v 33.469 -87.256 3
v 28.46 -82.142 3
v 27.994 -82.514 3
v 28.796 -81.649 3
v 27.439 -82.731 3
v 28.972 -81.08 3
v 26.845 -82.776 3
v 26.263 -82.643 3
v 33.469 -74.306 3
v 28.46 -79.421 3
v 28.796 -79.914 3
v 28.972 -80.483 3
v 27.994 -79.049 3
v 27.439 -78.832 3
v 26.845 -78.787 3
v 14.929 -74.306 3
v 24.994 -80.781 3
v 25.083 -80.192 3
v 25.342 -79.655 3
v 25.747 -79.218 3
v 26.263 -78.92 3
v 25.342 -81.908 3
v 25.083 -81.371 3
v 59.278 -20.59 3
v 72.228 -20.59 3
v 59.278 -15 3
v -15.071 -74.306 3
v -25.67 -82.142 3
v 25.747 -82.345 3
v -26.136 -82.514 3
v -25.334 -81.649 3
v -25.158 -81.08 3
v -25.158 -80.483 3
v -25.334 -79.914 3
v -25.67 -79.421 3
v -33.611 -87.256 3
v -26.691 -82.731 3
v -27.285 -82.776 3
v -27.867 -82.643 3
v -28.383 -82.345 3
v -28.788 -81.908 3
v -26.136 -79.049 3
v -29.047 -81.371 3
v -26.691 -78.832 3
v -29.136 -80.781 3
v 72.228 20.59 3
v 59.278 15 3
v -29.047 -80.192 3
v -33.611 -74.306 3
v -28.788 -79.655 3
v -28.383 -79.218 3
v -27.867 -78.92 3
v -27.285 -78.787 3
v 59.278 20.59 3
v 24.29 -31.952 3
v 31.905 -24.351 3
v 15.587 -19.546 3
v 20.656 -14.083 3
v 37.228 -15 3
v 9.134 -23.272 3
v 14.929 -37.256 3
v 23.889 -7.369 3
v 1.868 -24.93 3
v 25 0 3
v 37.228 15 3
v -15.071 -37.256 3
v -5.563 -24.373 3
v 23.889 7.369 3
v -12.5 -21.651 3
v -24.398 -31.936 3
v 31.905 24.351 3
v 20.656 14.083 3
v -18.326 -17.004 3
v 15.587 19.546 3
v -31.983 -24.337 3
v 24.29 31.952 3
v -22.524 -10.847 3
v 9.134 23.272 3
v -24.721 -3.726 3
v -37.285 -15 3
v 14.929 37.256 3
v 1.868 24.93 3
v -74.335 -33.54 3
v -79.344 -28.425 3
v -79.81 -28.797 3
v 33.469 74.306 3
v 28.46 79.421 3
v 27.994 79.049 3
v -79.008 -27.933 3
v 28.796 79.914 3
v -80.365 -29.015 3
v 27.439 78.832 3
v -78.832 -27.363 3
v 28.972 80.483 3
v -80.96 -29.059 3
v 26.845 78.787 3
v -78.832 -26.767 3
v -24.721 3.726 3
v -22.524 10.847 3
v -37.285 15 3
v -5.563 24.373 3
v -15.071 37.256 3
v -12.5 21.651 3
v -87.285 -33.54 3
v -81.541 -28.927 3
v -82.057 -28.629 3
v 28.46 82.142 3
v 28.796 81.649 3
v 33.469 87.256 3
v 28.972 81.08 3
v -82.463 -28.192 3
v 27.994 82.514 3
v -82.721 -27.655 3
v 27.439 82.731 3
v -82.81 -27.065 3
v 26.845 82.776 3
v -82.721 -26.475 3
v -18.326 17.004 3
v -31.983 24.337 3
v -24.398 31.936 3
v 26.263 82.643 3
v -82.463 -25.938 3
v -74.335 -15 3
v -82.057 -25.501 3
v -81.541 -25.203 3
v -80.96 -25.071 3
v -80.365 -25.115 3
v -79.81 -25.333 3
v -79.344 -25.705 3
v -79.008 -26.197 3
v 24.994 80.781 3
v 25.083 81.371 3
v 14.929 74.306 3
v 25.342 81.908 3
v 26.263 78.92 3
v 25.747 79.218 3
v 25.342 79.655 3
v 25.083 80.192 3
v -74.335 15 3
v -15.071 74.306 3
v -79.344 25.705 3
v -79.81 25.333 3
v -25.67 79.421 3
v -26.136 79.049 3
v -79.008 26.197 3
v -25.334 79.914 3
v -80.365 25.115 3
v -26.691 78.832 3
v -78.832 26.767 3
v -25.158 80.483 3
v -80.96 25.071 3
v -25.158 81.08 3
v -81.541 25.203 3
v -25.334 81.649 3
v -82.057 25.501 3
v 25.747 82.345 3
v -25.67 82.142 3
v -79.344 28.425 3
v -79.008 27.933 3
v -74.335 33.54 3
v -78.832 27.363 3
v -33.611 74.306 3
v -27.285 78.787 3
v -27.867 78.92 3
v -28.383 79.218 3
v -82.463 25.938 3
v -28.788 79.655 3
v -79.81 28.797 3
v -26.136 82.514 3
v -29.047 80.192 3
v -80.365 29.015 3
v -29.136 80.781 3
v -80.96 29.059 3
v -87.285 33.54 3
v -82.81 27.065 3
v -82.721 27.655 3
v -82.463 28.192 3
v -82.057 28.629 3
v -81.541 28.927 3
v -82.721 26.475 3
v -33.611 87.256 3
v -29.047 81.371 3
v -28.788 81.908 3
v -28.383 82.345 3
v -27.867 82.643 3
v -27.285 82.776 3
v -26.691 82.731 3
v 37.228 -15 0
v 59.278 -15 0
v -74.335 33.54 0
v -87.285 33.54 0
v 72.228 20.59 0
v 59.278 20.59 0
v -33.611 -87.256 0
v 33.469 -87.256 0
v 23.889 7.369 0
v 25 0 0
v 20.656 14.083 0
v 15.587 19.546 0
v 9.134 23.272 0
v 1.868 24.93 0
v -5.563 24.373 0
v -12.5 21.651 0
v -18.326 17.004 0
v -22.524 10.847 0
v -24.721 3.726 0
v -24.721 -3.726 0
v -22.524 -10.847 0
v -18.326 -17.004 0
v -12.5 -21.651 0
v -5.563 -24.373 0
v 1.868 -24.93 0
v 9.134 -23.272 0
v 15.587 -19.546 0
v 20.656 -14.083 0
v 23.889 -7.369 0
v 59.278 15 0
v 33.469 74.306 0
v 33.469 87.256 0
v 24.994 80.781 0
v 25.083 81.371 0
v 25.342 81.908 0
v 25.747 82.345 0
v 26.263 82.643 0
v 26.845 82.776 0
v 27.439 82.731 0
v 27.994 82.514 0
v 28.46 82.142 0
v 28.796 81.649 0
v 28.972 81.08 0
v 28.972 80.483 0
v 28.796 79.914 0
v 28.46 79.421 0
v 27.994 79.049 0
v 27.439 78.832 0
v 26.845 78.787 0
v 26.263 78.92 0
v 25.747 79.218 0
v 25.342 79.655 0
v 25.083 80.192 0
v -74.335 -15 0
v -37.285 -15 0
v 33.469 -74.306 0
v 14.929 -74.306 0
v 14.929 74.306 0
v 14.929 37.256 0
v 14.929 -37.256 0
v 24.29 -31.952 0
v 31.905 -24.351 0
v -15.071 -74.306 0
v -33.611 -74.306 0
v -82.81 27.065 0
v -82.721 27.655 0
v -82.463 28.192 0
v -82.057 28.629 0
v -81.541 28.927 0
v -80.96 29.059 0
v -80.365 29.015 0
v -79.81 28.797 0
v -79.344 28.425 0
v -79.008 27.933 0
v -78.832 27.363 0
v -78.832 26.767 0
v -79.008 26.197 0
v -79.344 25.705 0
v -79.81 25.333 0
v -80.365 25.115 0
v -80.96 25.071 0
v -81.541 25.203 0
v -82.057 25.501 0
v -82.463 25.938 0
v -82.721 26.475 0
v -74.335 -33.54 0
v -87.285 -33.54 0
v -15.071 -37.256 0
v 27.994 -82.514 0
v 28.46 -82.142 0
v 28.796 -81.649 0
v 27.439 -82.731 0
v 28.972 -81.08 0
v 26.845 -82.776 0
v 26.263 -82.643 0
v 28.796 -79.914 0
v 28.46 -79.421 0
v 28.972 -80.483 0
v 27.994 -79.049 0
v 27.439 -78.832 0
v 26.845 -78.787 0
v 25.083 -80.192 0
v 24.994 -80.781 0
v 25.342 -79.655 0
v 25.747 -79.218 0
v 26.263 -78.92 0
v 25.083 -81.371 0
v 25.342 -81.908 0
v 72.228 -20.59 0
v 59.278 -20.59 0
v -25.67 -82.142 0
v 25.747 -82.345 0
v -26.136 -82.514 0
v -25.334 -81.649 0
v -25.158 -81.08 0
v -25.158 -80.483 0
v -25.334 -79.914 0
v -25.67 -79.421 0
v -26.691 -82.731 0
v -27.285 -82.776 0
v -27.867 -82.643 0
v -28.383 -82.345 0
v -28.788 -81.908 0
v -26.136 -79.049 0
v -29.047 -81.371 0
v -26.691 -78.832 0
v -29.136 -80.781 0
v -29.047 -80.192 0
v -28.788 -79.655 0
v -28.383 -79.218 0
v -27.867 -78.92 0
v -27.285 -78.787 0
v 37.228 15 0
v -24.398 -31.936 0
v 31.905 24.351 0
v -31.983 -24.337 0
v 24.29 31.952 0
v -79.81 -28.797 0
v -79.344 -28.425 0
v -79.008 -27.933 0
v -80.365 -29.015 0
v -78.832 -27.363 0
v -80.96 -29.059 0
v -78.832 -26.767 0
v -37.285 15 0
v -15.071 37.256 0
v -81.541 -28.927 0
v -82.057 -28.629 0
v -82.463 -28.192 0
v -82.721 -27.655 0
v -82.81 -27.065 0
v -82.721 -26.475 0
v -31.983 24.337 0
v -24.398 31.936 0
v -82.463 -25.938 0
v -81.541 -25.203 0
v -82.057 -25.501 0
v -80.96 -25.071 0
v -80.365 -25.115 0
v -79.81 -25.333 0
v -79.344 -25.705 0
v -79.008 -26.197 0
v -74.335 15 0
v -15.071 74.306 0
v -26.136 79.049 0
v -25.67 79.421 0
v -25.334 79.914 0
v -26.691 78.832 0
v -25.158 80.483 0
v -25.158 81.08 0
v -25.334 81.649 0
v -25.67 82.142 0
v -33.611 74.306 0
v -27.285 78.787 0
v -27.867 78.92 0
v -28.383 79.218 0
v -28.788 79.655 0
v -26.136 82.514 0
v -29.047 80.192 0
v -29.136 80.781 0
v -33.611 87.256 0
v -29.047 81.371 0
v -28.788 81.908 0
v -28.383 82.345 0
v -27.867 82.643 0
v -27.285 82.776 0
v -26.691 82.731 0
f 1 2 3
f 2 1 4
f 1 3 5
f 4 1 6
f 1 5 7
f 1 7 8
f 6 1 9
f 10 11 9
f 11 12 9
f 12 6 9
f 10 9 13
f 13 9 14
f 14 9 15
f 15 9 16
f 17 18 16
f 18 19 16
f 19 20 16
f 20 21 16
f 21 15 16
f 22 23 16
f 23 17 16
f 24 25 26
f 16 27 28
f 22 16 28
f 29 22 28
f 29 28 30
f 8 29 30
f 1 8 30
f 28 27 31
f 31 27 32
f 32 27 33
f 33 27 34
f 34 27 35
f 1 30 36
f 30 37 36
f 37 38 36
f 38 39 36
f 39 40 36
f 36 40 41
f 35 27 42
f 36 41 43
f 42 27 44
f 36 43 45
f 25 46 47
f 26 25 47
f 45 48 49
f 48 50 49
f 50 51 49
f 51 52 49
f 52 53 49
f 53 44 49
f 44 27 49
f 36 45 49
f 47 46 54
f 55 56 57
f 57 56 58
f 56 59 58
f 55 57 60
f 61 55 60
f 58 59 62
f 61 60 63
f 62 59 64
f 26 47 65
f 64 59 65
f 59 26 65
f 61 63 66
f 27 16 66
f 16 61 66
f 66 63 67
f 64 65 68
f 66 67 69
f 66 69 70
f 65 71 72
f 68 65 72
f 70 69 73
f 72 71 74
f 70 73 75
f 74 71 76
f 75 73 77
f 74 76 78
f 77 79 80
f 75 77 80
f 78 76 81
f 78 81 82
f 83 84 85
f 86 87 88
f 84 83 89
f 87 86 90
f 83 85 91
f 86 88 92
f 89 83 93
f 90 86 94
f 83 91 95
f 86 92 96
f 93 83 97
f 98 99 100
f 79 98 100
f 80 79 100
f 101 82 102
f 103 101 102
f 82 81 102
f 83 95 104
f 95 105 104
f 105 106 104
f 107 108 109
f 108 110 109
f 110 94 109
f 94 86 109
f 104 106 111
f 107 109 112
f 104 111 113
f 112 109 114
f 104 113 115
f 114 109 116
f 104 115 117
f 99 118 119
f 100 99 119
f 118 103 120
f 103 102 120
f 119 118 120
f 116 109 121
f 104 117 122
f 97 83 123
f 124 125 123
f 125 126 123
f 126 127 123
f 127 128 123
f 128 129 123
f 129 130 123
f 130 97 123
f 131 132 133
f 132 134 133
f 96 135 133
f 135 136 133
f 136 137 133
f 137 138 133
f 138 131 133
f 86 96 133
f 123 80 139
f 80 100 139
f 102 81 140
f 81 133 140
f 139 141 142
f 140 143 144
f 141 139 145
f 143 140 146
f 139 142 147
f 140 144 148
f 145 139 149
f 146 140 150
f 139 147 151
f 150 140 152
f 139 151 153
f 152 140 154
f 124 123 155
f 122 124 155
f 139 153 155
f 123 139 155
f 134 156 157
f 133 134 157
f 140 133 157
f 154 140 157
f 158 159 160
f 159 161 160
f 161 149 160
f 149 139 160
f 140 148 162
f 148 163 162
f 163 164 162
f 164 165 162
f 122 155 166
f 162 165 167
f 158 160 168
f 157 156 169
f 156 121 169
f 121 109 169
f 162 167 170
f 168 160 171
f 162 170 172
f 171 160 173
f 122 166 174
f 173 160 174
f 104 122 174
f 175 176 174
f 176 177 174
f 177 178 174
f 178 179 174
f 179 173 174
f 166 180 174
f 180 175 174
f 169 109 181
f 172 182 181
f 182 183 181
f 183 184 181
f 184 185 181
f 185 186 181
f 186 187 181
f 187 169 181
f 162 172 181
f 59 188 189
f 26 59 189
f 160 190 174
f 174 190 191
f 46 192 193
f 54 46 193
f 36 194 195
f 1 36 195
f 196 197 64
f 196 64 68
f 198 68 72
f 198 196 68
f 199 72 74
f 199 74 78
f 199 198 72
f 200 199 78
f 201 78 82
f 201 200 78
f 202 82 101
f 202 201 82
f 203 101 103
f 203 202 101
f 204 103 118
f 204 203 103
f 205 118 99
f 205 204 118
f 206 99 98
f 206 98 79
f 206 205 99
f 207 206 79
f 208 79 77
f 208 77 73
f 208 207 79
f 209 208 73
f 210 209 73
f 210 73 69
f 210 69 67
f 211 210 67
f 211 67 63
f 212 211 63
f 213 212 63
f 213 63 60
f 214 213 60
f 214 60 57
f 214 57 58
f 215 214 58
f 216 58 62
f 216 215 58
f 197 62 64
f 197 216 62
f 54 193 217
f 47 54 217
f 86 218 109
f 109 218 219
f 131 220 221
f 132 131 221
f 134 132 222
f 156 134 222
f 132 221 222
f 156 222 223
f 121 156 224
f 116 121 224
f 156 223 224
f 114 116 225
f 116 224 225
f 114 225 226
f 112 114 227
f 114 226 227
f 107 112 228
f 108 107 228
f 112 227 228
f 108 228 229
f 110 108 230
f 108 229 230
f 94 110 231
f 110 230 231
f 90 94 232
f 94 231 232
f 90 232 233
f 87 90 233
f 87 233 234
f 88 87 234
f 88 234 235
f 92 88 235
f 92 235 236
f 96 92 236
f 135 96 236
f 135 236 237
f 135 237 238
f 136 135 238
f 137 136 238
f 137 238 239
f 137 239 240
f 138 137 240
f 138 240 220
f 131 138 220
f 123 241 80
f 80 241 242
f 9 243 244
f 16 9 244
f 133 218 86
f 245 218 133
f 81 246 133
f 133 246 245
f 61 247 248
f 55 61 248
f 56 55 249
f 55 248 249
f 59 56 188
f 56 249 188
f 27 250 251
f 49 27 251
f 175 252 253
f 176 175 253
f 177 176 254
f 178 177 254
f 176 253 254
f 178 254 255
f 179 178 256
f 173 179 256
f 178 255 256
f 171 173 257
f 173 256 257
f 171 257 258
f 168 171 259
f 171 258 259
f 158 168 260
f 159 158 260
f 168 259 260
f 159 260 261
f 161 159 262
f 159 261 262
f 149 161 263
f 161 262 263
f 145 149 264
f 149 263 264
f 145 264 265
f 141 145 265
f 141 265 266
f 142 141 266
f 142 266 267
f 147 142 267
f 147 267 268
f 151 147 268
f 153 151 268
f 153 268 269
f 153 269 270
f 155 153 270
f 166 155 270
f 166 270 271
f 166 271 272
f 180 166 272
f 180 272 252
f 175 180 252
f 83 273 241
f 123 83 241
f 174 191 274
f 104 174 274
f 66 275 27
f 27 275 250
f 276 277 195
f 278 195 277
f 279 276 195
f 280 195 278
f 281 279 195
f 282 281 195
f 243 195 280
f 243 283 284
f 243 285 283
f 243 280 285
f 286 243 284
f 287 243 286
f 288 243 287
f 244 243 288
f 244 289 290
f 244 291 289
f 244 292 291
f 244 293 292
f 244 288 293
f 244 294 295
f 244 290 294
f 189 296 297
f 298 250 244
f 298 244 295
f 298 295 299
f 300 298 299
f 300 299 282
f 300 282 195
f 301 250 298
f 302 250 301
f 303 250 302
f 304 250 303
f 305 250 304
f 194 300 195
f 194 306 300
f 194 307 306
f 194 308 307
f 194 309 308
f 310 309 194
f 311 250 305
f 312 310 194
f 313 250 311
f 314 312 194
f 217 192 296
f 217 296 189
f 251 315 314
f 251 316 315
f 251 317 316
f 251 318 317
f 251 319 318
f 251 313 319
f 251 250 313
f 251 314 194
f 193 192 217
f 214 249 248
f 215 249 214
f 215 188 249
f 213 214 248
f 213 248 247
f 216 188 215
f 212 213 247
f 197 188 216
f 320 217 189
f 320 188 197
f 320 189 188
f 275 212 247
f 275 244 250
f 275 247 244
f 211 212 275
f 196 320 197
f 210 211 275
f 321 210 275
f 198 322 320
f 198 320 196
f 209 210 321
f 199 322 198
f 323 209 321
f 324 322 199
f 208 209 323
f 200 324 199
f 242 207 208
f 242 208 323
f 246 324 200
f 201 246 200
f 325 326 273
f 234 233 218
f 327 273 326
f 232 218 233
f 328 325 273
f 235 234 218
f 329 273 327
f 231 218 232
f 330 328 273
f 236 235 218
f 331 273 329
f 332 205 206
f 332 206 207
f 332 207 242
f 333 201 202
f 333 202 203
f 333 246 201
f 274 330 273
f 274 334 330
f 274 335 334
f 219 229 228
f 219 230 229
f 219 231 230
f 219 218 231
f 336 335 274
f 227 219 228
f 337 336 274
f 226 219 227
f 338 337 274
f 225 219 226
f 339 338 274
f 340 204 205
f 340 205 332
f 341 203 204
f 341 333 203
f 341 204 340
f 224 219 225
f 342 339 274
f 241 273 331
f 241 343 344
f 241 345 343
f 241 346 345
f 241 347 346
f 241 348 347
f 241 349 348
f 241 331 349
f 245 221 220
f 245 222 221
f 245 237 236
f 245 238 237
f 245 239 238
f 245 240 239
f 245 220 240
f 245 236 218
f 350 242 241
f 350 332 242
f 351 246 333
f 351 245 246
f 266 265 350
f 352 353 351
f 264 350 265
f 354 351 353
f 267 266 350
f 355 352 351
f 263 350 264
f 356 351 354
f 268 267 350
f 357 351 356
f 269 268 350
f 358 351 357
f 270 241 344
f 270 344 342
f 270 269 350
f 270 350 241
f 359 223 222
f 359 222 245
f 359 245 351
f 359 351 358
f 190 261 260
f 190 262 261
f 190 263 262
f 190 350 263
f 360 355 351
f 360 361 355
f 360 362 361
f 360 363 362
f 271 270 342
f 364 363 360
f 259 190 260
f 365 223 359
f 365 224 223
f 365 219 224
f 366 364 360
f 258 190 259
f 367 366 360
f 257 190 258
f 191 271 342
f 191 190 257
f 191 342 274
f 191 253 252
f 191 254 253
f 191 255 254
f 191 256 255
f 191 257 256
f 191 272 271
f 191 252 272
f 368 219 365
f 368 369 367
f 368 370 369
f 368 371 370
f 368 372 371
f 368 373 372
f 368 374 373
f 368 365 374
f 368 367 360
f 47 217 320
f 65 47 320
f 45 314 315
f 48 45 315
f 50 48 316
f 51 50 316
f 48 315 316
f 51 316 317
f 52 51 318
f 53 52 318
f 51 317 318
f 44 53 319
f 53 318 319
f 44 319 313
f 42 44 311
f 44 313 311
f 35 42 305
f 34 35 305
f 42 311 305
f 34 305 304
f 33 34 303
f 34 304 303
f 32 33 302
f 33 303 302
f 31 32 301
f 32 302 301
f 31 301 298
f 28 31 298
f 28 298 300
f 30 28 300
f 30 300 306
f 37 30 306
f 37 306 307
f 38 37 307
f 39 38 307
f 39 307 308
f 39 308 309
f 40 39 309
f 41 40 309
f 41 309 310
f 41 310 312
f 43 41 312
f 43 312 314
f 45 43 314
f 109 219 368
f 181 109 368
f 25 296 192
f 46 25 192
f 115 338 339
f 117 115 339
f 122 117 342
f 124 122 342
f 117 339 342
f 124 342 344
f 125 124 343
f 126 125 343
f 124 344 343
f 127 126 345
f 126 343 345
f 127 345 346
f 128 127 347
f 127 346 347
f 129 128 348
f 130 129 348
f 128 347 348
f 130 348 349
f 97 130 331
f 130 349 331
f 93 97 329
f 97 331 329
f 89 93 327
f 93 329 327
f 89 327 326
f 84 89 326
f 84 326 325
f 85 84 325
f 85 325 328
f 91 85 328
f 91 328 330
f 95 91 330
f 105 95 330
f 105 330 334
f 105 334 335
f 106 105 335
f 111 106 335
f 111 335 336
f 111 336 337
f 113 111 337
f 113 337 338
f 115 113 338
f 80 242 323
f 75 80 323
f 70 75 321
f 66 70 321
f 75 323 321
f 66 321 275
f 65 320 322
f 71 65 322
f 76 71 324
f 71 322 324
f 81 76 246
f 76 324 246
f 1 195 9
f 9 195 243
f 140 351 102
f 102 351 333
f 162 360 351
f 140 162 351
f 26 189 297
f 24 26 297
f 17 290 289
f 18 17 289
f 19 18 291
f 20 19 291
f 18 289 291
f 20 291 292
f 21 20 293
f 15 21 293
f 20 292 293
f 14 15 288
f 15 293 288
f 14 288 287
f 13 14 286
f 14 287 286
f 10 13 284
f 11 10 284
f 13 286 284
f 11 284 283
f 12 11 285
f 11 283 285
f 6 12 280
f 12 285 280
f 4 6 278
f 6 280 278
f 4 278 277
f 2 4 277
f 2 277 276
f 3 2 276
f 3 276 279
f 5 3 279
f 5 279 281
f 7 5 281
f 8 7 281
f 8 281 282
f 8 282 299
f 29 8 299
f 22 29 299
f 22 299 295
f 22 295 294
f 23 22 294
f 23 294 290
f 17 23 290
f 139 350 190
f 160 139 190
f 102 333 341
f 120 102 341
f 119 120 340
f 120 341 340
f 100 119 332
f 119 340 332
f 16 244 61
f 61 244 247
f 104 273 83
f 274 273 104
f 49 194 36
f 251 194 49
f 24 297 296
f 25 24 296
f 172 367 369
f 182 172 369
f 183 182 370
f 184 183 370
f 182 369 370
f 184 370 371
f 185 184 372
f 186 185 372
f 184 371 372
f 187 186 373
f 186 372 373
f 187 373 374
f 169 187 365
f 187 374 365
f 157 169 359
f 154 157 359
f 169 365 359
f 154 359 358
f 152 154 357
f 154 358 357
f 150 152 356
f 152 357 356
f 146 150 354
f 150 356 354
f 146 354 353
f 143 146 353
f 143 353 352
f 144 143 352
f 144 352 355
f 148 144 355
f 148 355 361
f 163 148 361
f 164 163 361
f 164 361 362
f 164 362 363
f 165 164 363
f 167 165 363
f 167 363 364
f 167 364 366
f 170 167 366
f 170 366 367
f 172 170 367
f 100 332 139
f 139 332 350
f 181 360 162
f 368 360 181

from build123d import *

# Parameters (mm, degrees)
CROQUIS1_R              = 25
SALIENTE_EXTRUIR1_DEPTH = 3
CROQUIS2_W              = 12.95
CROQUIS2_H              = 12.95
SALIENTE_EXTRUIR2_DEPTH = 3
CROQUIS3_R              = 2
CORTAR_EXTRUIR1_DEPTH   = 124.455998815


with BuildPart() as part:
    # Croquis1 → Saliente-Extruir1 (new body)
    with BuildSketch(Plane.XY):
        with BuildLine():
            Line((-15.070986718, 74.306476298), (-15.070986718, 37.256476298))
            ThreePointArc((-15.070986718, 37.256476298), (-28.445175059, 28.391049341), (-37.285113206, 15))
            Line((-37.285113206, 15), (-74.335113206, 15))
            Line((-74.335113206, 15), (-74.335113206, 20.59))
            Line((-74.335113206, 20.59), (-87.285113206, 20.59))
            Line((-87.285113206, 20.59), (-87.285113206, -20.59))
            Line((-87.285113206, -20.59), (-74.335113206, -20.59))
            Line((-74.335113206, -20.59), (-74.335113206, -15))
            Line((-74.335113206, -15), (-37.285113206, -15))
            ThreePointArc((-37.285113206, -15), (-28.445175059, -28.391049341), (-15.070986718, -37.256476298))
            Line((-15.070986718, -37.256476298), (-15.070986718, -74.306476298))
            Line((-15.070986718, -74.306476298), (-20.660986718, -74.306476298))
            Line((-20.660986718, -74.306476298), (-20.660986718, -87.256476298))
            Line((-20.660986718, -87.256476298), (20.519013282, -87.256476298))
            Line((20.519013282, -87.256476298), (20.519013282, -74.306476298))
            Line((20.519013282, -74.306476298), (14.929013282, -74.306476298))
            Line((14.929013282, -74.306476298), (14.929013282, -37.256476298))
            ThreePointArc((14.929013282, -37.256476298), (28.353570497, -28.407666286), (37.22795272, -15))
            Line((37.22795272, -15), (59.27795272, -15))
            Line((59.27795272, -15), (59.27795272, -20.59))
            Line((59.27795272, -20.59), (72.22795272, -20.59))
            Line((72.22795272, -20.59), (72.22795272, 20.59))
            Line((72.22795272, 20.59), (59.27795272, 20.59))
            Line((59.27795272, 20.59), (59.27795272, 15))
            Line((59.27795272, 15), (37.22795272, 15))
            ThreePointArc((37.22795272, 15), (28.353570497, 28.407666286), (14.929013282, 37.256476298))
            Line((14.929013282, 37.256476298), (14.929013282, 74.306476298))
            Line((14.929013282, 74.306476298), (20.519013282, 74.306476298))
            Line((20.519013282, 74.306476298), (20.519013282, 87.256476298))
            Line((20.519013282, 87.256476298), (-20.660986718, 87.256476298))
            Line((-20.660986718, 87.256476298), (-20.660986718, 74.306476298))
            Line((-20.660986718, 74.306476298), (-15.070986718, 74.306476298))
        make_face()
        Circle(CROQUIS1_R, mode=Mode.SUBTRACT)
    extrude(amount=SALIENTE_EXTRUIR1_DEPTH)

    # Croquis2 → Saliente-Extruir2 (add)
    with BuildSketch(Plane(origin=(0, 0, 0), x_dir=(-1, 0, 0), z_dir=(0, 0, -1))):
        with Locations((-26.994013282, 80.781476298)):
            Rectangle(CROQUIS2_W, CROQUIS2_H)
        with Locations((27.135986718, 80.781476298)):
            Rectangle(CROQUIS2_W, CROQUIS2_H)
        with Locations((-26.994013282, -80.781476298)):
            Rectangle(CROQUIS2_W, CROQUIS2_H)
        with Locations((27.135986718, -80.781476298)):
            Rectangle(CROQUIS2_W, CROQUIS2_H)
        with Locations((80.810113206, 27.065)):
            Rectangle(CROQUIS2_W, CROQUIS2_H)
        with Locations((80.810113206, -27.065)):
            Rectangle(CROQUIS2_W, CROQUIS2_H)
    extrude(amount=-SALIENTE_EXTRUIR2_DEPTH)

    # Croquis3 → Cortar-Extruir1 (cut, through all)
    with BuildSketch(Plane(origin=(0, 0, 0), x_dir=(-1, 0, 0), z_dir=(0, 0, -1))):
        with Locations((-26.994013282, 80.781476298)):
            Circle(CROQUIS3_R)
        with Locations((27.135986718, 80.781476298)):
            Circle(CROQUIS3_R)
        with Locations((27.135986718, -80.781476298)):
            Circle(CROQUIS3_R)
        with Locations((-26.994013282, -80.781476298)):
            Circle(CROQUIS3_R)
        with Locations((80.810113206, -27.065)):
            Circle(CROQUIS3_R)
        with Locations((80.810113206, 27.065)):
            Circle(CROQUIS3_R)
    extrude(amount=-CORTAR_EXTRUIR1_DEPTH, mode=Mode.SUBTRACT)


solid = part.part
